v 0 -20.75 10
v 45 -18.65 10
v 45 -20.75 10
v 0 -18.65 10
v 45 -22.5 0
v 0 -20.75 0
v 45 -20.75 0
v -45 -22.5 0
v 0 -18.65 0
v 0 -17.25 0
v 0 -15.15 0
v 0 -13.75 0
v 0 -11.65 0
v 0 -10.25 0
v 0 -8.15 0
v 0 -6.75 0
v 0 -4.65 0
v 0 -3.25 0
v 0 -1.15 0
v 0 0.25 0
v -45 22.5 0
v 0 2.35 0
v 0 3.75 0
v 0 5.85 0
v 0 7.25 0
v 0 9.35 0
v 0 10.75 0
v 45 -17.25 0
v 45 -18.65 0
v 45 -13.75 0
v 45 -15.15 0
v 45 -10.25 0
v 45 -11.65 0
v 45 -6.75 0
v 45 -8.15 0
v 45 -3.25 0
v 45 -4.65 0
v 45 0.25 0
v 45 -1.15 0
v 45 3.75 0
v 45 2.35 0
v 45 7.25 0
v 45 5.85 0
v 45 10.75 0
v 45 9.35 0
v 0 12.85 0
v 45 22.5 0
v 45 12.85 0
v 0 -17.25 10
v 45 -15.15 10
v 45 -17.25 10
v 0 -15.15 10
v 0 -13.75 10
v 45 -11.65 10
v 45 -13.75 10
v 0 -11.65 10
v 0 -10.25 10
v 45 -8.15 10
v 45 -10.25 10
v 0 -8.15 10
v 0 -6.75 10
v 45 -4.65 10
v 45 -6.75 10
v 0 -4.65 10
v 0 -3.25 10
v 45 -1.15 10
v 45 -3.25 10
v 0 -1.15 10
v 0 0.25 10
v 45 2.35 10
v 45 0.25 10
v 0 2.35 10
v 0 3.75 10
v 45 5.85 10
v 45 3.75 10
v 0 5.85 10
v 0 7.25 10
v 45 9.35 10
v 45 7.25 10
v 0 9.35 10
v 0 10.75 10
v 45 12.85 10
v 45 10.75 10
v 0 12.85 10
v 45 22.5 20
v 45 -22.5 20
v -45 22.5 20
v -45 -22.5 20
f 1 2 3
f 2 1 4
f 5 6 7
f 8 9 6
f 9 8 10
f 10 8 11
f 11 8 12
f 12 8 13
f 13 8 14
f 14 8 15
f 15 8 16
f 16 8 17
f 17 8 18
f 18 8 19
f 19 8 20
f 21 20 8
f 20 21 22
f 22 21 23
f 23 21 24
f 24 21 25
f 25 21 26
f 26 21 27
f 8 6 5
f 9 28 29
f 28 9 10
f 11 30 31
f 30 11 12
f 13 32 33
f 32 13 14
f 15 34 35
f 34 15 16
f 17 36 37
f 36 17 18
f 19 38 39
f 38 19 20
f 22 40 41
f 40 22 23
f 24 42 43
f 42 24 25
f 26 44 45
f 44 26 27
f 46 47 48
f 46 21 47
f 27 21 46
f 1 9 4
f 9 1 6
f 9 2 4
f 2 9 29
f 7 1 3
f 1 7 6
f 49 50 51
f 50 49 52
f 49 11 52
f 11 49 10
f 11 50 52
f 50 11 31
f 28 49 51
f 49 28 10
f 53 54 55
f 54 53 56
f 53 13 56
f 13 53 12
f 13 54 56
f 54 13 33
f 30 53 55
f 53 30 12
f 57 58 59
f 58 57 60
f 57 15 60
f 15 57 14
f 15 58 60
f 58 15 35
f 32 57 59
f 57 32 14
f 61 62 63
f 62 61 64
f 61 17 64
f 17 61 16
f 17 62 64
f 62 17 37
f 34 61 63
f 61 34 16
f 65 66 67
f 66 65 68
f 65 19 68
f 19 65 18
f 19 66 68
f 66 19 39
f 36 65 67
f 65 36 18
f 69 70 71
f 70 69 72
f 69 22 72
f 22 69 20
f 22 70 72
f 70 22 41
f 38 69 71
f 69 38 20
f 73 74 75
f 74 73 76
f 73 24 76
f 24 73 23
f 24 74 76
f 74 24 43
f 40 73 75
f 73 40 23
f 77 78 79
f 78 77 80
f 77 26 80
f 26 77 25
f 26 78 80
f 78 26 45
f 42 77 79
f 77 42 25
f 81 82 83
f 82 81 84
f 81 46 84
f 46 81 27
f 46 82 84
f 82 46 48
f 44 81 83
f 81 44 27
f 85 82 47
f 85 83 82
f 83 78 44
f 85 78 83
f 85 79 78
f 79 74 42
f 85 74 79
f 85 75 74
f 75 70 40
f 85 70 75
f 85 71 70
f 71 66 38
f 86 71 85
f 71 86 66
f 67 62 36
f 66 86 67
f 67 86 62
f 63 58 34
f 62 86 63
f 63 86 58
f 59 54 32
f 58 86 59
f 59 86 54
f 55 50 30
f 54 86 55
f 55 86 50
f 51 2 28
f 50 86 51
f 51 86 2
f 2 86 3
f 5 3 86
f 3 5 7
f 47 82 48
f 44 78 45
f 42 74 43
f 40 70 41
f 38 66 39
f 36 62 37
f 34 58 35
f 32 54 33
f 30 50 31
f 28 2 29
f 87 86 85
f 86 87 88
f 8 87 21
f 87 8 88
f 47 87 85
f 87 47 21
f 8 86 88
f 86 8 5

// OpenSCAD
// Drying rack for microscope slides - a solid base block with a row of parallel slots open at the
// top, so slides standing on their long edge are half immersed in water and dry upright. NOVEL
// general part (a generic "slide rack" rather than any one lab's part).
//

slides   = 10;
slide_w  = 75;
slide_h  = 25;
slide_t  = 1;
base_l   = 90;
base_w   = 45;
base_h   = 20;
slot_l   = 77;
slot_w   = 1.6;
slot_d   = 10;
pitch    = 3.5;

$fn = 48;

slot_w_eff = slot_w + 0.5;   // open the cut so it doesn't bridge between pixels

difference() {
    translate([-base_l / 2, -base_w / 2, 0]) cube([base_l, base_w, base_h]);
    for (i = [0 : slides - 1])
        translate([0, -base_w / 2 + pitch / 2 + i * pitch, 0])
            cube([slot_l, slot_w_eff, slot_d]);
}
